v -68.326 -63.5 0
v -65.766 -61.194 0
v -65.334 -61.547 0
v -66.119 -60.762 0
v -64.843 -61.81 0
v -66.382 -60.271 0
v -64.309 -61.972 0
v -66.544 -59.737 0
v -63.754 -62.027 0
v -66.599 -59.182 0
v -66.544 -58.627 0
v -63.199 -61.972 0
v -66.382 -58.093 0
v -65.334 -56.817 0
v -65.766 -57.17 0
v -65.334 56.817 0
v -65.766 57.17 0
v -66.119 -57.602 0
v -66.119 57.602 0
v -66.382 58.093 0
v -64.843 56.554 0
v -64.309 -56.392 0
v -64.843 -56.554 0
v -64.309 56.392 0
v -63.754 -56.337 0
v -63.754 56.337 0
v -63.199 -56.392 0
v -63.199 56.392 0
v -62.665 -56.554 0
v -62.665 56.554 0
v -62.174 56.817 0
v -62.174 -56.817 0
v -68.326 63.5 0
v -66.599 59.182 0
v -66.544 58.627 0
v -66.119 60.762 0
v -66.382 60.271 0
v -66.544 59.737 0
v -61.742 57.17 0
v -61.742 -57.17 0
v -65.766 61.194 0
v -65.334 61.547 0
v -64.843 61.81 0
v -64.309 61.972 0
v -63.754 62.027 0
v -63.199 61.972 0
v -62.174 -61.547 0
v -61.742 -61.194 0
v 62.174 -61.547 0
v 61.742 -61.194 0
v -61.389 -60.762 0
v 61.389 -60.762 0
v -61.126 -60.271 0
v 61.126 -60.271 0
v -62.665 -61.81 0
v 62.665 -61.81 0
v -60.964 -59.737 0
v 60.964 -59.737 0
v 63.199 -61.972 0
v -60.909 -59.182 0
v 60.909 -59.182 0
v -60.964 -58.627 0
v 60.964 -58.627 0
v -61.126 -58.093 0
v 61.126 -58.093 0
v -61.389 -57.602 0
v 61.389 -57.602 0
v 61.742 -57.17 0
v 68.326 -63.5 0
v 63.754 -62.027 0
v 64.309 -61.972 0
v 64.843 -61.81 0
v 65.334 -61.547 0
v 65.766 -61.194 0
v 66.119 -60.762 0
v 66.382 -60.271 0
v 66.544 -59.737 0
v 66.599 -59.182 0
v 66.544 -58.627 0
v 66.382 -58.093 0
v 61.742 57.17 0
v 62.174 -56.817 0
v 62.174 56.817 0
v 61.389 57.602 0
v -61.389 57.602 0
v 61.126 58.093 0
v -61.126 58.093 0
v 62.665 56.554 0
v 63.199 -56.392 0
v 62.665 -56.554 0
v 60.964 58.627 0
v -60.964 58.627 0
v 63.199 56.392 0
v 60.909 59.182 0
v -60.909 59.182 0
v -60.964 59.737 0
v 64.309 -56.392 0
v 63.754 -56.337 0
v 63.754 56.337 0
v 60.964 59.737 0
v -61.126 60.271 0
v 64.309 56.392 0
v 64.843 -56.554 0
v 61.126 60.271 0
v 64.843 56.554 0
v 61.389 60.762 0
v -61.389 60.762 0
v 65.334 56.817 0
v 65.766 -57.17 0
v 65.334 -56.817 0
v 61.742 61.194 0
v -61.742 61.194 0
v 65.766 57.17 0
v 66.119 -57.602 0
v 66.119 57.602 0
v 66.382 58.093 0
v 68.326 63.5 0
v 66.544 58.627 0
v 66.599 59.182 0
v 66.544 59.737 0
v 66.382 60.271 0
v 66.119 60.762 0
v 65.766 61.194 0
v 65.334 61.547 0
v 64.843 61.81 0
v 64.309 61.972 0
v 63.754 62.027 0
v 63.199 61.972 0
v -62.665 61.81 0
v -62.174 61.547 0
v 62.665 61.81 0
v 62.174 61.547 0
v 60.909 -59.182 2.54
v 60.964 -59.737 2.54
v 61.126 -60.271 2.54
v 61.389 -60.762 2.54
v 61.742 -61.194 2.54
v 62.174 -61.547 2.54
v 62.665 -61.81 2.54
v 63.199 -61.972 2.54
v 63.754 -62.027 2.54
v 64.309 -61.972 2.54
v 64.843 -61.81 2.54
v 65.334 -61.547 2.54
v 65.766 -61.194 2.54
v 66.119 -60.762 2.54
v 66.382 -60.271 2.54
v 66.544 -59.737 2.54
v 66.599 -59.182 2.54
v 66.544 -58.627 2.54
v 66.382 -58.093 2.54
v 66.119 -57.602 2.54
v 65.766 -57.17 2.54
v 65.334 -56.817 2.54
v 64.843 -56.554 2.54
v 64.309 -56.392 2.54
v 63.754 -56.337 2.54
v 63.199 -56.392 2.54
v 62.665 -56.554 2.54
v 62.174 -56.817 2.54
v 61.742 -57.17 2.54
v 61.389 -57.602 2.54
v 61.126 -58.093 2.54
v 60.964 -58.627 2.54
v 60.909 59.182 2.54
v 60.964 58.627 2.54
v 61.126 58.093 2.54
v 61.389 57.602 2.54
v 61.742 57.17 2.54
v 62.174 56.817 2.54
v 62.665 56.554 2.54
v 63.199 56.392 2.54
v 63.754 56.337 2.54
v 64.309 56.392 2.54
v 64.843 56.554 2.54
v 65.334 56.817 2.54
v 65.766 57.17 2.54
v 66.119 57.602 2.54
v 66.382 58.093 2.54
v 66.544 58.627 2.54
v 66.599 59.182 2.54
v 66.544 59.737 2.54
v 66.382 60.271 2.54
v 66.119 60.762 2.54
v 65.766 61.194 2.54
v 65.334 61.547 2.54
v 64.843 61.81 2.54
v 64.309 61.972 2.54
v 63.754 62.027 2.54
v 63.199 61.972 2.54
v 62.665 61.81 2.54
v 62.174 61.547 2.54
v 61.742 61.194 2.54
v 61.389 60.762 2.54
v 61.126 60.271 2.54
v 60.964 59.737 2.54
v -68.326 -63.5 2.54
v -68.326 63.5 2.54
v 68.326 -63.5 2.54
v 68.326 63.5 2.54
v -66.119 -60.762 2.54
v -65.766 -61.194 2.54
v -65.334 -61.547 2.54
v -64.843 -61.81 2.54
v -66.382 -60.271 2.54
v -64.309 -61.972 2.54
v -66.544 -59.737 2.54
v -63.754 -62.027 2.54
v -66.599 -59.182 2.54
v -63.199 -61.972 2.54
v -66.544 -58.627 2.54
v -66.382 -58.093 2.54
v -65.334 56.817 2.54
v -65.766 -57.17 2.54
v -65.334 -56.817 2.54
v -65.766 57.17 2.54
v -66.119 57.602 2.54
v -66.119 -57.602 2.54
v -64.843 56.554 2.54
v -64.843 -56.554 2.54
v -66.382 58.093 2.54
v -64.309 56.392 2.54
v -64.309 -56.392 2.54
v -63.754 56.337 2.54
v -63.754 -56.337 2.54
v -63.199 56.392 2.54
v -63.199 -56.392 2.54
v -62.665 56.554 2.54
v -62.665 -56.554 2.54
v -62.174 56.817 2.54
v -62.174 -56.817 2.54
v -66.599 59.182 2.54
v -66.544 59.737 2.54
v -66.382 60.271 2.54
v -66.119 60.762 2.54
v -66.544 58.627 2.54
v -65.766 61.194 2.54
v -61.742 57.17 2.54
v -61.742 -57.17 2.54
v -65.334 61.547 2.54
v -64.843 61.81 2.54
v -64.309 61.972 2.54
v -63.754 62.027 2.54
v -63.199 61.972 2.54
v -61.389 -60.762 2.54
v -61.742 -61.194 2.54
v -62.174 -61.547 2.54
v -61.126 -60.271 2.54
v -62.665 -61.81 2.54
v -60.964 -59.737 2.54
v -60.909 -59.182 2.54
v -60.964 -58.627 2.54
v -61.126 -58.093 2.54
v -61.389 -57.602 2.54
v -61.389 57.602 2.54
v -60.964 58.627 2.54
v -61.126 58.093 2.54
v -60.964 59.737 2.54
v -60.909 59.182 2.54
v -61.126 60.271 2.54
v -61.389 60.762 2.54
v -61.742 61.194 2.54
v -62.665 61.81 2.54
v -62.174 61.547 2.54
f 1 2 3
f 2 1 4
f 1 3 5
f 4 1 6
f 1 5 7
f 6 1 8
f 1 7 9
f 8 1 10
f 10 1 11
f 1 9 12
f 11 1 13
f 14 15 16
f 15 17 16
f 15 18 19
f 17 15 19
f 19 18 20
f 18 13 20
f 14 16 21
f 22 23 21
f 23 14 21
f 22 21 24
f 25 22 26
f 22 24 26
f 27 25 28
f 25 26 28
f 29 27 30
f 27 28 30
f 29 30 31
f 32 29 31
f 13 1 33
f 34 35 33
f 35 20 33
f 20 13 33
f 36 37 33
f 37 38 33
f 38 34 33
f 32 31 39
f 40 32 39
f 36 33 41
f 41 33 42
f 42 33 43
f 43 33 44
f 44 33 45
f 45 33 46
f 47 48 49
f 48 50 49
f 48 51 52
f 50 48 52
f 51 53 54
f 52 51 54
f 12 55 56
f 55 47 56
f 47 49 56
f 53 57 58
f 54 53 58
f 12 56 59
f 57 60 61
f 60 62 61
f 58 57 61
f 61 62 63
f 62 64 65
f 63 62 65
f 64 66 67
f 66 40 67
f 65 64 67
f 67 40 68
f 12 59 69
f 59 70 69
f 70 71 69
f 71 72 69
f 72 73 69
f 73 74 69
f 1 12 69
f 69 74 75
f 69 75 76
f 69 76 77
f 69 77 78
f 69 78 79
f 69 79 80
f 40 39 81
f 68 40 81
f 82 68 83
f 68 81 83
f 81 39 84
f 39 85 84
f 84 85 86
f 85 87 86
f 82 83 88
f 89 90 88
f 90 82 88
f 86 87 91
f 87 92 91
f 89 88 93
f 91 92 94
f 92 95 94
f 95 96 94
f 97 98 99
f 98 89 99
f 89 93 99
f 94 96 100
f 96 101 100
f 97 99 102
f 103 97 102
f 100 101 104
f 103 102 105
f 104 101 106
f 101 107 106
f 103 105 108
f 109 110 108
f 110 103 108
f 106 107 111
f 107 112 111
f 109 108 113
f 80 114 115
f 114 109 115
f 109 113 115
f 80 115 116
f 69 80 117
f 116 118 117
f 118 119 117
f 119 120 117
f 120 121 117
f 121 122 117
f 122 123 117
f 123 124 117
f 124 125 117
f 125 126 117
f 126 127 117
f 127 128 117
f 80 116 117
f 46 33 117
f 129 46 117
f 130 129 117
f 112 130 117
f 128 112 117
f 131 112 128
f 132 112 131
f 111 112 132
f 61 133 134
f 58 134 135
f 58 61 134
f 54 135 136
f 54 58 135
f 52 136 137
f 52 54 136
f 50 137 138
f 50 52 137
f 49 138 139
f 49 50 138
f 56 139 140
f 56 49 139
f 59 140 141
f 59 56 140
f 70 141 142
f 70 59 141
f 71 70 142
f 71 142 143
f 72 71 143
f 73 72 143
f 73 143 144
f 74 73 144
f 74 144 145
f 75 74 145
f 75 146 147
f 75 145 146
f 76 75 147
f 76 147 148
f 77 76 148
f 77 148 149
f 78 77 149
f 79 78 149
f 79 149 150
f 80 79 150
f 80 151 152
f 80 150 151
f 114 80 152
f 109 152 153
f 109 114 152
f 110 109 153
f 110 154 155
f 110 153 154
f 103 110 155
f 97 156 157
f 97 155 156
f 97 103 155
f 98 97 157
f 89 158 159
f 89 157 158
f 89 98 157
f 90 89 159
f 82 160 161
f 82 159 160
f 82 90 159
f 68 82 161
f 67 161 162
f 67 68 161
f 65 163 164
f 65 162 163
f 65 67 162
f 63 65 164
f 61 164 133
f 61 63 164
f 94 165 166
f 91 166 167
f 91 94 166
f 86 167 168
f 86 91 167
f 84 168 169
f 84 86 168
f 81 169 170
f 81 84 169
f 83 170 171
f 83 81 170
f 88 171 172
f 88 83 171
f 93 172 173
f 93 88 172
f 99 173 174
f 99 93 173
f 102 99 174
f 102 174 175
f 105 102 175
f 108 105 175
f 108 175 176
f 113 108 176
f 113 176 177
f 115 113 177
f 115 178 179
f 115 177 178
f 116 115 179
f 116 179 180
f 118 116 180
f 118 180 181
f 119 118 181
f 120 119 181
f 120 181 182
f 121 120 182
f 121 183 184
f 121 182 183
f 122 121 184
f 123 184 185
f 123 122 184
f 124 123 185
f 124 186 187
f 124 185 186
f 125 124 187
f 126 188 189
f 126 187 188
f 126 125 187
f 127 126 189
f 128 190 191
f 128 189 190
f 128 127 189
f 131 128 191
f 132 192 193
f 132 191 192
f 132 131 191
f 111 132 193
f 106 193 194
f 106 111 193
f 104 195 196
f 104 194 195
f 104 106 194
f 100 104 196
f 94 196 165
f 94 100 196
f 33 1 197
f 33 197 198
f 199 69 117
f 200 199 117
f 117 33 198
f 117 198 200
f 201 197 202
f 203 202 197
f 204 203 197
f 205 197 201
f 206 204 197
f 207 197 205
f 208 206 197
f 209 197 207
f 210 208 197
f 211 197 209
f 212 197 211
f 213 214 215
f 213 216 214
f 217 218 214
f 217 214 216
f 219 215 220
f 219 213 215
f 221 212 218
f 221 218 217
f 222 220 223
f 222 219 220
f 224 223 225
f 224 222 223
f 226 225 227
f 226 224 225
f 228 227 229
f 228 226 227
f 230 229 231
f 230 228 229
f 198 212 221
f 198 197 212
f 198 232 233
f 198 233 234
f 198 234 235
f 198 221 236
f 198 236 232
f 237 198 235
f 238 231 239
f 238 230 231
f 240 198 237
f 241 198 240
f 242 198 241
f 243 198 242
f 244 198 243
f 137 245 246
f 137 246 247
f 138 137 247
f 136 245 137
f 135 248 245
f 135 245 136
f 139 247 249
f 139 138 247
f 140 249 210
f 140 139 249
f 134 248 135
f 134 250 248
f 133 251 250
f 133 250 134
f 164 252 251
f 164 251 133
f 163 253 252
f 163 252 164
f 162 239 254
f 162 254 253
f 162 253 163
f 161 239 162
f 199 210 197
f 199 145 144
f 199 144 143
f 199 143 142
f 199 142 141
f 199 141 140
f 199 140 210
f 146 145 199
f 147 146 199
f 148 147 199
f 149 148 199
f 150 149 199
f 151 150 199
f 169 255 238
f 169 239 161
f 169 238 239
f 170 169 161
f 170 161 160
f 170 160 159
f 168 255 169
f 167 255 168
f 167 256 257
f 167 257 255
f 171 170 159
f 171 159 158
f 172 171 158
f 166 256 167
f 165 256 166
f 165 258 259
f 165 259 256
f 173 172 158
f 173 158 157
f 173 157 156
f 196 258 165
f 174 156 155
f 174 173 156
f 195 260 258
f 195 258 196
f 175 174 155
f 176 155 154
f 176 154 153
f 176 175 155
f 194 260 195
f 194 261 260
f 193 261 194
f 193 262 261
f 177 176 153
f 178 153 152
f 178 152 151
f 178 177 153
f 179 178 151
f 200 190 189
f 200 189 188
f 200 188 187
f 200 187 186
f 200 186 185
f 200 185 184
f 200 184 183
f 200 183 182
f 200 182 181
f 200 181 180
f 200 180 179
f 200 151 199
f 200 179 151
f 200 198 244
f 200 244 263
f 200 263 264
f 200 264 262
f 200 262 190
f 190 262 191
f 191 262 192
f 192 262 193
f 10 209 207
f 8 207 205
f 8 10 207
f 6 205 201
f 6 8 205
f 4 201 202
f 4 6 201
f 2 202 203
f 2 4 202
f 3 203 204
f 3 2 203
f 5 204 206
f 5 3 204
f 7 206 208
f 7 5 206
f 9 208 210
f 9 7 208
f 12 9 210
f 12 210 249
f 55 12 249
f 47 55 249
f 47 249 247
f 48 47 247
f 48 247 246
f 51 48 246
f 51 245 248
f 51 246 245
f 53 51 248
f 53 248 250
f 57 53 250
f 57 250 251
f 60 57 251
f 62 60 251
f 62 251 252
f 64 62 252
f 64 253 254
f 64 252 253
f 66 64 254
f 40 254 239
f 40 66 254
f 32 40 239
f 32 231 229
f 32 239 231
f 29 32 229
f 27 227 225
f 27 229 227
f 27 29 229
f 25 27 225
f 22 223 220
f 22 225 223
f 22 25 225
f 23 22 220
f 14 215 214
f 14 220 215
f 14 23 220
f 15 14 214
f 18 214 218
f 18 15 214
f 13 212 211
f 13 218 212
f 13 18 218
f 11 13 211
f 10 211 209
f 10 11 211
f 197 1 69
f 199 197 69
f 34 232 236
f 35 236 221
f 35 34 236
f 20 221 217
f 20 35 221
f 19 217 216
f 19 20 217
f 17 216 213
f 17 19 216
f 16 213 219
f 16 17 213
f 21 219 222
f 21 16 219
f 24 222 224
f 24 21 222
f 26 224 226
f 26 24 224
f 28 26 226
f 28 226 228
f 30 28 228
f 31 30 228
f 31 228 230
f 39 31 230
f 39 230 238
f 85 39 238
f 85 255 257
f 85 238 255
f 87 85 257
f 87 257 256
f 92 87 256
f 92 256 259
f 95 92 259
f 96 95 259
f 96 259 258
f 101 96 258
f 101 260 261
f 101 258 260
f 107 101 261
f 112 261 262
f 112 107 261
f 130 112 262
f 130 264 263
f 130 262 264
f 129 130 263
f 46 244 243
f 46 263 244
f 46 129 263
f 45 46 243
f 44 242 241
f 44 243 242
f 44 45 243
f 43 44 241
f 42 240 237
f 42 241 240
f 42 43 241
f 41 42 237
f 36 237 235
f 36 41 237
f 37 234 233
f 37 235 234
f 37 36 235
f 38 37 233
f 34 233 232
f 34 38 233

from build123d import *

# Parameters (mm, degrees)
SKETCH1_W             = 136.652
SKETCH1_H             = 127
BOSS_EXTRUDE1_DEPTH   = 2.54
SKETCH1_5_OUTSIDE_W   = 175.966
SKETCH1_5_OUTSIDE_H   = 166.314
SKETCH1_5_OUTSIDE_W_2 = 136.652
SKETCH1_5_OUTSIDE_H_2 = 127
SKETCH1_5_OUTSIDE_R   = 2.8448
CUT_EXTRUDE3_DEPTH    = 30.48


with BuildPart() as part:
    # Sketch1 → Boss-Extrude1 (new body)
    with BuildSketch(Plane.XY):
        Rectangle(SKETCH1_W, SKETCH1_H)
    extrude(amount=BOSS_EXTRUDE1_DEPTH)

    # Sketch1<5> outside → Cut-Extrude3 (cut)
    # profile 1 of 5: a face of its own
    with BuildSketch(Plane.XY):
        Rectangle(SKETCH1_5_OUTSIDE_W, SKETCH1_5_OUTSIDE_H)
        Rectangle(SKETCH1_5_OUTSIDE_W_2, SKETCH1_5_OUTSIDE_H_2, mode=Mode.SUBTRACT)
    # profile 2 of 5: a face of its own
    with BuildSketch(Plane.XY):
        with Locations((-63.754, 59.182)):
            Circle(SKETCH1_5_OUTSIDE_R)
    # profile 3 of 5: a face of its own
    with BuildSketch(Plane.XY):
        with Locations((63.754, 59.182)):
            Circle(SKETCH1_5_OUTSIDE_R)
    # profile 4 of 5: a face of its own
    with BuildSketch(Plane.XY):
        with Locations((63.754, -59.182)):
            Circle(SKETCH1_5_OUTSIDE_R)
    # profile 5 of 5: a face of its own
    with BuildSketch(Plane.XY):
        with Locations((-63.754, -59.182)):
            Circle(SKETCH1_5_OUTSIDE_R)
    extrude(amount=CUT_EXTRUDE3_DEPTH, mode=Mode.SUBTRACT)


solid = part.part
